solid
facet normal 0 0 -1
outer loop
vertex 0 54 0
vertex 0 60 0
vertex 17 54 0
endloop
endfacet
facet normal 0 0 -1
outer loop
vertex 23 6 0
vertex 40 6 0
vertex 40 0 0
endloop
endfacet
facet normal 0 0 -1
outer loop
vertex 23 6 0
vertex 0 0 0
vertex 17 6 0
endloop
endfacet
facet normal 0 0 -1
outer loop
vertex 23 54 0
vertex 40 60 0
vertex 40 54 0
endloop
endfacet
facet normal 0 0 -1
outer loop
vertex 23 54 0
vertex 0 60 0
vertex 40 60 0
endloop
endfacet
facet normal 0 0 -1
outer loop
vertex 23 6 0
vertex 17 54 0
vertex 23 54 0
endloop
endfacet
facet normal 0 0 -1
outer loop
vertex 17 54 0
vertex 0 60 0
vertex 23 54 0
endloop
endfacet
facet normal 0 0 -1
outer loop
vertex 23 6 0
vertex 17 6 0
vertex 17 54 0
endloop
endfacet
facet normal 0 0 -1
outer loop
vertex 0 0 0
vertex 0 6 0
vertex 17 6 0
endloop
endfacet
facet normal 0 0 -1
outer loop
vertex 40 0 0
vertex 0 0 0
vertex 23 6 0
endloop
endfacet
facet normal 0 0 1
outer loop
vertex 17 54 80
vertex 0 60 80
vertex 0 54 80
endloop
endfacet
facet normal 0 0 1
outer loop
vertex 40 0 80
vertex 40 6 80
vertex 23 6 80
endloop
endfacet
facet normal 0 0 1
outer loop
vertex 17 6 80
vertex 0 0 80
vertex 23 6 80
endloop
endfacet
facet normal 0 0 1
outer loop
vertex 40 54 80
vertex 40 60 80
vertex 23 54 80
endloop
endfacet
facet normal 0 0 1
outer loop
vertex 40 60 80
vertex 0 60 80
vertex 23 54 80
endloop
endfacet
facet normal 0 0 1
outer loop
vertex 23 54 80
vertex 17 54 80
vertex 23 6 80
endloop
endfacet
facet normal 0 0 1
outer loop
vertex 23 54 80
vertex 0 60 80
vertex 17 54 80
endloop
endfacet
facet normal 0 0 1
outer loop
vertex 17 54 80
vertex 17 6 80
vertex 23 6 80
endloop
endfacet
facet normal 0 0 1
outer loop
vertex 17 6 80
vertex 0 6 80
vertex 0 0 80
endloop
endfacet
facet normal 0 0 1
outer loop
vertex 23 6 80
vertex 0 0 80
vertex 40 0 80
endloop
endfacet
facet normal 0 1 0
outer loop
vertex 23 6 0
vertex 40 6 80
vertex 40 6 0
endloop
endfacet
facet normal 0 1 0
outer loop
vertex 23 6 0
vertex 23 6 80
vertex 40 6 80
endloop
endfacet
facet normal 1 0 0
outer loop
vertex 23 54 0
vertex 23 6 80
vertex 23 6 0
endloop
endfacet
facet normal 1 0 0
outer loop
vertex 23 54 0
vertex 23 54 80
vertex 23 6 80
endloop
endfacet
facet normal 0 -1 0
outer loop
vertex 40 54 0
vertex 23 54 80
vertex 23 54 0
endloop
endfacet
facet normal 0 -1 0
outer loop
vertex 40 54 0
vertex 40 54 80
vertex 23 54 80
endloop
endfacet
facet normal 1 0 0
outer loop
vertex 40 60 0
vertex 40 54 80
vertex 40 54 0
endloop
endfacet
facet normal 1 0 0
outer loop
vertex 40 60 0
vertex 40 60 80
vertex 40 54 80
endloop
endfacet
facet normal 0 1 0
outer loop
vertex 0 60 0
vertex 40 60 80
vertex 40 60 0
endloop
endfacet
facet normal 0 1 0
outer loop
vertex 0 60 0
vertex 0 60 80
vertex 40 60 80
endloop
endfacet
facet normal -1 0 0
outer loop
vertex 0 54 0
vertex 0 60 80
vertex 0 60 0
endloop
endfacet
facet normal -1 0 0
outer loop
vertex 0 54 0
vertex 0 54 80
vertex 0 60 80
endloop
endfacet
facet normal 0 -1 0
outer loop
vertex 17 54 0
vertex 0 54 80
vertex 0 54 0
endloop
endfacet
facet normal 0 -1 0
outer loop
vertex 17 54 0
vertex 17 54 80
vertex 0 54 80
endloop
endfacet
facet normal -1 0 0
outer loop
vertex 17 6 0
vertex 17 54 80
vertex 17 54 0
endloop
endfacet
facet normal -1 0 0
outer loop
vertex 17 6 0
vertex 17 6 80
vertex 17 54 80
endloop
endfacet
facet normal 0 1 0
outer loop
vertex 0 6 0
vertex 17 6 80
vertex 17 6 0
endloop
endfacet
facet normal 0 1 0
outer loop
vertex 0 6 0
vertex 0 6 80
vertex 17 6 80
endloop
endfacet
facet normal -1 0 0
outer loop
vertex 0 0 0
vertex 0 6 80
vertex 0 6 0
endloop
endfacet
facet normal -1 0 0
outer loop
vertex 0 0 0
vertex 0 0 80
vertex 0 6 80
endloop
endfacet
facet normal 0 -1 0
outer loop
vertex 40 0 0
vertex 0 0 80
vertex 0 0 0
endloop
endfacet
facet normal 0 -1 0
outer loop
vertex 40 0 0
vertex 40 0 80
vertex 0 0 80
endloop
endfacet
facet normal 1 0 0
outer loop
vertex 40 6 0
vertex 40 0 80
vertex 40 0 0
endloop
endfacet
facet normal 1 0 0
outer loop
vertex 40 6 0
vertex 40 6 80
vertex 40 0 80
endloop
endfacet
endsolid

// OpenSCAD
$fn = 32;

// ----------------------------------------------------------------------
// Structural section: ibeam 40 x 60 mm
// ----------------------------------------------------------------------

// --- parameters (mm) ---
sec_w = 40;               // section width, X
sec_h = 60;               // section height, Y
flange_t = 6;             // flange thickness
web_t = 6;                // web thickness
plate_t = 80;             // cut length, Z (extrusion height)
fit_tol = 0.05;           // declared fit tolerance (prompt contract)
free_tol = 0.3;           // declared free tolerance (prompt contract)

profile = [[0, 0], [40, 0], [40, 6], [23, 6], [23, 54], [40, 54], [40, 60], [0, 60], [0, 54], [17, 54], [17, 6], [0, 6]];  // primary outline, 12 points, counter clockwise

// --- the one profile operation ---
linear_extrude(height = plate_t) polygon(points = profile);
